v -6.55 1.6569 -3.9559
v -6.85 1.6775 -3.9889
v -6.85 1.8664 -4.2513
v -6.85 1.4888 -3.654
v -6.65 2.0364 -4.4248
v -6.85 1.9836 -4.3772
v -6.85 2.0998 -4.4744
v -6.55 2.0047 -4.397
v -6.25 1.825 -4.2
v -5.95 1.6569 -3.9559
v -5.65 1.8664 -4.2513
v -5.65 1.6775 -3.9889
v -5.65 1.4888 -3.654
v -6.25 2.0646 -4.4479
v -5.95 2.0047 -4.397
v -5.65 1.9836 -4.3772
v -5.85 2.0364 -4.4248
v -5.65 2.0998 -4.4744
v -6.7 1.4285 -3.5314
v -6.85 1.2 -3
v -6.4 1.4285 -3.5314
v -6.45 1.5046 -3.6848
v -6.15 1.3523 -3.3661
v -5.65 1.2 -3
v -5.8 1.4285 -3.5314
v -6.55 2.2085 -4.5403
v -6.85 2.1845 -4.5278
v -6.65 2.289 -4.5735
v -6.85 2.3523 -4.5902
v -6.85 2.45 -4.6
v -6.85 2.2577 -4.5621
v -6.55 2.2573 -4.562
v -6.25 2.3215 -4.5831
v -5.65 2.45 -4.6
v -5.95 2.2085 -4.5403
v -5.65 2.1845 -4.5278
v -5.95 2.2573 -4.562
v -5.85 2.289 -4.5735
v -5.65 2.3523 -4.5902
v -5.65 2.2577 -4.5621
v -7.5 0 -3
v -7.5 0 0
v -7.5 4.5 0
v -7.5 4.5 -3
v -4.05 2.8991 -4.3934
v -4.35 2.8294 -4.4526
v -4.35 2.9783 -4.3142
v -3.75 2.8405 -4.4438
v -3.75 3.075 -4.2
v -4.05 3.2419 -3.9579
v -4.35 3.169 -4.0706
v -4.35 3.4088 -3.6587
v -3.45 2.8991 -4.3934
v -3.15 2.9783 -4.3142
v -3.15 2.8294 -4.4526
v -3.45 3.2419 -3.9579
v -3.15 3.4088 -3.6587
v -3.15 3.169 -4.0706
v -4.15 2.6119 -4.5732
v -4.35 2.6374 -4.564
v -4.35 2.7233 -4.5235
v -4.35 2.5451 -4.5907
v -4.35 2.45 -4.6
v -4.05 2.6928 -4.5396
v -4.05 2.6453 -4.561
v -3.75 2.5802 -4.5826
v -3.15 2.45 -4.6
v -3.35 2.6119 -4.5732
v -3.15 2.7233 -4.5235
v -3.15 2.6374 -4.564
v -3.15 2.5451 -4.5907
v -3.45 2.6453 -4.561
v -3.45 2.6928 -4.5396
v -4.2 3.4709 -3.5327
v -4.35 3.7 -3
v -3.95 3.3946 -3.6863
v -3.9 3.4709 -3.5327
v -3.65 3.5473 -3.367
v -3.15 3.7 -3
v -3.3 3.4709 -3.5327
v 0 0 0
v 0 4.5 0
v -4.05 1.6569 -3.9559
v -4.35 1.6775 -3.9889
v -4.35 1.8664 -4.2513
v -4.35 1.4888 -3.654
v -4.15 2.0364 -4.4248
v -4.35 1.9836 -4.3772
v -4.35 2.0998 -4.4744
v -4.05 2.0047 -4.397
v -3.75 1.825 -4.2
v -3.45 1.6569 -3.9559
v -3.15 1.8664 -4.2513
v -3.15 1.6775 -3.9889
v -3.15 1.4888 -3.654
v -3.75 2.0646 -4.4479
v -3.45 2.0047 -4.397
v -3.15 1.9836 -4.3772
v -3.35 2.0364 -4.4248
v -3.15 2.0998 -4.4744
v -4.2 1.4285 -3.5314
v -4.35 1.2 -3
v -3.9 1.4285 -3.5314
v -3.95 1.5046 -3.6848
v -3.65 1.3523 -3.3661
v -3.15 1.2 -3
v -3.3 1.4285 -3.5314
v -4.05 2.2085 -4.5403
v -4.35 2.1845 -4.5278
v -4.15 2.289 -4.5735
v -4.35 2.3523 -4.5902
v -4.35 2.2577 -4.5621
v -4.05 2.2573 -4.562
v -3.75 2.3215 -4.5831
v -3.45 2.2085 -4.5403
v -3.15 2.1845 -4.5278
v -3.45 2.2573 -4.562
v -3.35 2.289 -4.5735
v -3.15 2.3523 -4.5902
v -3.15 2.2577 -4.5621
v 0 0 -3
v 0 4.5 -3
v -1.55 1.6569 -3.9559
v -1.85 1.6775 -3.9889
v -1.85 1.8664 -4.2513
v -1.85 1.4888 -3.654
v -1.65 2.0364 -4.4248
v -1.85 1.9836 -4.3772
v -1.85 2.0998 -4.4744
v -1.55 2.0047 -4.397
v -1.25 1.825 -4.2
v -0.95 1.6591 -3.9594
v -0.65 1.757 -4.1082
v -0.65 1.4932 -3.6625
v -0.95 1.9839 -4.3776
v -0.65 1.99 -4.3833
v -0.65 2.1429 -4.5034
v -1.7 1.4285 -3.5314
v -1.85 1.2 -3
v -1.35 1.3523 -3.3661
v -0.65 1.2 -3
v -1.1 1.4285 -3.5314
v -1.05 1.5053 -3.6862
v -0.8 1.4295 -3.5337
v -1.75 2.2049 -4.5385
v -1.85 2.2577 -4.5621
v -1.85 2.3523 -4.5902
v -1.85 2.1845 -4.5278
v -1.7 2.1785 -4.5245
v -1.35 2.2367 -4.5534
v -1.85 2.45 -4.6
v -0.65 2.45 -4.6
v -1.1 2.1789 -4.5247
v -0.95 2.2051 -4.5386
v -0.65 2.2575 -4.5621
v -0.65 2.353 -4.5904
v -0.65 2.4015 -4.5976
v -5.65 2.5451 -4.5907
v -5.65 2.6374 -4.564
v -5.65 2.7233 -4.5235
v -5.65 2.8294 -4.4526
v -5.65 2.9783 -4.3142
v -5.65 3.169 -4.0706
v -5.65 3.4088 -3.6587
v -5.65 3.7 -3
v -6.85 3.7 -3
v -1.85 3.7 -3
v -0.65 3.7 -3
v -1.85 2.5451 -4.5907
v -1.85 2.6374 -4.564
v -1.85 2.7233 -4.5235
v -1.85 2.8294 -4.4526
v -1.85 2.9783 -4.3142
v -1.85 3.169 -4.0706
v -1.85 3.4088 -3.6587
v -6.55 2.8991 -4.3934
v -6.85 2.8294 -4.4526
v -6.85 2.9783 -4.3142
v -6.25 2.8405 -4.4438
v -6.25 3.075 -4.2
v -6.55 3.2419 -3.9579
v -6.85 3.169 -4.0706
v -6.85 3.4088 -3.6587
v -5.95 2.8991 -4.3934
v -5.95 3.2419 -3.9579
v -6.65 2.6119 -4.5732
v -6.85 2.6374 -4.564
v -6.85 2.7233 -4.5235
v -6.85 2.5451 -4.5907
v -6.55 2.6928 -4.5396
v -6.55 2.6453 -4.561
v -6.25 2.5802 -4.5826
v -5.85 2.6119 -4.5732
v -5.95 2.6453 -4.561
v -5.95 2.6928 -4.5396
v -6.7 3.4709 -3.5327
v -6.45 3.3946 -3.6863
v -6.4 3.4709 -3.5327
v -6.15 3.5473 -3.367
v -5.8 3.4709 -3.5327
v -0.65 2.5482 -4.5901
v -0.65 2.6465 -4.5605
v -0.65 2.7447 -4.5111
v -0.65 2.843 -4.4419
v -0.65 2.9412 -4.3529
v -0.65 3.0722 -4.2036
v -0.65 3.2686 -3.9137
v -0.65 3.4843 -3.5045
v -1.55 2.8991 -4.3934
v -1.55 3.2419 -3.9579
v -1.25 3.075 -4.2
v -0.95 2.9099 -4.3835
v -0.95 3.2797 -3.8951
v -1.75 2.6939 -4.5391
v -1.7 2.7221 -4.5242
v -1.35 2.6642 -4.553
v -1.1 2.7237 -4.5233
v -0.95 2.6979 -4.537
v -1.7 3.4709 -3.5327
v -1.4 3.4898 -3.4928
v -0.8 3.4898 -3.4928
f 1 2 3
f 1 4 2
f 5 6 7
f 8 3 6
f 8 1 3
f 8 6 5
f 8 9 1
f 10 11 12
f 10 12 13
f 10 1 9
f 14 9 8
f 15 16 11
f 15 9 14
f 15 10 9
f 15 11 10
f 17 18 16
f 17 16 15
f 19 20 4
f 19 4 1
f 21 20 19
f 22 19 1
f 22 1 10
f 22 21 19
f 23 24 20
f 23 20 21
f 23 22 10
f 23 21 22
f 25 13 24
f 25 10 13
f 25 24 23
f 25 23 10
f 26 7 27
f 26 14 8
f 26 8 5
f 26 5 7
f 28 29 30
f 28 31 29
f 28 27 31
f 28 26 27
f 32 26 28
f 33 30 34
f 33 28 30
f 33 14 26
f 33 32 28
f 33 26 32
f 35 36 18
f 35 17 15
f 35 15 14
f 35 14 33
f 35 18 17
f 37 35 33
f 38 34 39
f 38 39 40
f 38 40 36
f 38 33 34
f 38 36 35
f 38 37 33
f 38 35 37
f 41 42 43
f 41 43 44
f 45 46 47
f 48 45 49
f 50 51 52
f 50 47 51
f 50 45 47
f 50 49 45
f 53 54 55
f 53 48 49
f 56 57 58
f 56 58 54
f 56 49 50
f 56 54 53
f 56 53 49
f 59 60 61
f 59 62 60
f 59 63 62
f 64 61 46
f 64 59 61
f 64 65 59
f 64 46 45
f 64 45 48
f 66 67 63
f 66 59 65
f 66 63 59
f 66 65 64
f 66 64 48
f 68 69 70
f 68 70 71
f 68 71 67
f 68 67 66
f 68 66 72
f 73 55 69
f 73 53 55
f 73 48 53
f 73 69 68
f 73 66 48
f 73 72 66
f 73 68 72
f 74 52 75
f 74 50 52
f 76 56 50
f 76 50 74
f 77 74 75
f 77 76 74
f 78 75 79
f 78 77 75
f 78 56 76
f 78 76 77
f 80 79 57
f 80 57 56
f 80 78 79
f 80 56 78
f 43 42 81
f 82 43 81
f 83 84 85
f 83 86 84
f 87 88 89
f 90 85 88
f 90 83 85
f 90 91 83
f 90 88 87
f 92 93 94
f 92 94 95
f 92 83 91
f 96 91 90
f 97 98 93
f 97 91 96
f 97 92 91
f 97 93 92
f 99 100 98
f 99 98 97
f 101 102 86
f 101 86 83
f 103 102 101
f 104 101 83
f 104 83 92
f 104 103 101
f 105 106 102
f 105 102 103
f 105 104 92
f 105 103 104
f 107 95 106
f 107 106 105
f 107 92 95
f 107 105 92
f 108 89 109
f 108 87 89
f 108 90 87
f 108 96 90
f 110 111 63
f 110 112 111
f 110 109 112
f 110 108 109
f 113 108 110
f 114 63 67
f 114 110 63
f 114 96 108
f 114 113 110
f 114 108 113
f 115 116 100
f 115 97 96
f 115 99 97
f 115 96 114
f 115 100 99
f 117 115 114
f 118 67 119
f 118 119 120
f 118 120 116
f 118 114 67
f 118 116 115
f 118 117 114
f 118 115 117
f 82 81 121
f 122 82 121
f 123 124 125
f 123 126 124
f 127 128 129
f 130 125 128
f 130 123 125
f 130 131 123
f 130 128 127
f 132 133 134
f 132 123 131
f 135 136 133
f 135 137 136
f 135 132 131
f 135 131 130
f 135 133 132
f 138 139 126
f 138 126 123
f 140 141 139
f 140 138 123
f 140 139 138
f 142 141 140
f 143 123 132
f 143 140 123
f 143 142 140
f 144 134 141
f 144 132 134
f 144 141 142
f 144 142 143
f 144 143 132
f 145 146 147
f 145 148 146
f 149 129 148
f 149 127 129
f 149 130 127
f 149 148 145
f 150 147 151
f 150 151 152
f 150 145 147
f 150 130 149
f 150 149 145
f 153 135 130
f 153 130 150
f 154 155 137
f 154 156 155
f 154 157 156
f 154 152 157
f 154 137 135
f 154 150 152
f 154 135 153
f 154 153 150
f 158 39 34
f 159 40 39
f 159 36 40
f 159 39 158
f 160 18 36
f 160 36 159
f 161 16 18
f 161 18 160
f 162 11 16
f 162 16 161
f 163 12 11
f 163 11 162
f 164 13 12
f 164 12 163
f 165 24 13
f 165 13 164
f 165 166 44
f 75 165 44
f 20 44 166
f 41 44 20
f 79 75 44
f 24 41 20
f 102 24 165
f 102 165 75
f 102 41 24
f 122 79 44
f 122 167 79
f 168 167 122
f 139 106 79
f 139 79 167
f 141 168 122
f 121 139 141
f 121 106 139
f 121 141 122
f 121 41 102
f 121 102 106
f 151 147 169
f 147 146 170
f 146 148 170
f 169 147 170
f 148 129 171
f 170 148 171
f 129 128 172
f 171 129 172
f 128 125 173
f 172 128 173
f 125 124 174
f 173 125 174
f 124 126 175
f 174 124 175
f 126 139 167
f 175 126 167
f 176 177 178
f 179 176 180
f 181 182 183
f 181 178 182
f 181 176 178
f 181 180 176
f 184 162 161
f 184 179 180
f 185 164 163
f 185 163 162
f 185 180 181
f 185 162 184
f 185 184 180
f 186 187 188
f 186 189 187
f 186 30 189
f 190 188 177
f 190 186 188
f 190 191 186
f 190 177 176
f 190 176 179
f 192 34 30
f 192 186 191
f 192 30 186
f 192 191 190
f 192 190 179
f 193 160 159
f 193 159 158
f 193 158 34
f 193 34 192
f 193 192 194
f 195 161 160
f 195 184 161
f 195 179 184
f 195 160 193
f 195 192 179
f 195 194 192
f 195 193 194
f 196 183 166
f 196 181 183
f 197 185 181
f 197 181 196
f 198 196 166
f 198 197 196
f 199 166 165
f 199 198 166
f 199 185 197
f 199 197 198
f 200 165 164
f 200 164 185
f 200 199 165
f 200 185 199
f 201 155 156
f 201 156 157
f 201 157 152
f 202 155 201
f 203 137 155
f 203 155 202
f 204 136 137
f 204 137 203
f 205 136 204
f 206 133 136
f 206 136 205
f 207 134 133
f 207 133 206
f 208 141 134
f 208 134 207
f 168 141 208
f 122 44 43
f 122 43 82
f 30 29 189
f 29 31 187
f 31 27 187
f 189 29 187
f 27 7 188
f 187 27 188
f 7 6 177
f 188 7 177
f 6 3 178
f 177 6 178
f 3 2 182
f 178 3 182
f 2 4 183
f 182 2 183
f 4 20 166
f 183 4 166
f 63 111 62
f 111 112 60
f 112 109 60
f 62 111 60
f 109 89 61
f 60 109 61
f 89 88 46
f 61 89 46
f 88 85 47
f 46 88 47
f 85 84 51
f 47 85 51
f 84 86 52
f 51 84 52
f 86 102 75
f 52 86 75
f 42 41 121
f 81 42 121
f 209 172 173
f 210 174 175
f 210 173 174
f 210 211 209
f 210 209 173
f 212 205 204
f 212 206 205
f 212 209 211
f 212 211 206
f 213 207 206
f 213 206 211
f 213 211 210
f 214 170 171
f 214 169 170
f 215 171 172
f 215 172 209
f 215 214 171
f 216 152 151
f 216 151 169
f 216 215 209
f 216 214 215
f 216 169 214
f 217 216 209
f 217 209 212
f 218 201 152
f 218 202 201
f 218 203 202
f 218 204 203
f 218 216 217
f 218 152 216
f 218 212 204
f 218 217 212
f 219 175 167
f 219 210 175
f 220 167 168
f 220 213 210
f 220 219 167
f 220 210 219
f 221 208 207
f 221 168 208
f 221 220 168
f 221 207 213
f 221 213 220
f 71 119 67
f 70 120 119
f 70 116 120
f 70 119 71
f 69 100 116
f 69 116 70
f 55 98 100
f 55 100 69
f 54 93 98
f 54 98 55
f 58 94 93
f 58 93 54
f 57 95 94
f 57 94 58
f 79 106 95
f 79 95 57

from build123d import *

# Parameters (mm, degrees)
SKETCH_1_W          = 7.5
SKETCH_1_H          = 3
EXTRUDE_1_DEPTH     = 4.5
SKETCH_2_W          = 1.2
SKETCH_2_H          = 2.5
EXTRUDE_2_DEPTH     = 1.6
CUT_EXTRUDE_1_DEPTH = 10.39853712


with BuildPart() as part:
    # 草图1 → 凸台-拉伸1 (new body)
    with BuildSketch(Plane(origin=(0, 0, 0), x_dir=(1, 0, 0), z_dir=(0, 1, 0))):
        with Locations((-3.75, 1.5)):
            Rectangle(SKETCH_1_W, SKETCH_1_H)
    extrude(amount=EXTRUDE_1_DEPTH)

    # 草图2 → 凸台-拉伸2 (add)
    with BuildSketch(Plane(origin=(0, 0, -3), x_dir=(-1, 0, 0), z_dir=(0, 0, -1))):
        with Locations((1.25, 2.45)):
            Rectangle(SKETCH_2_W, SKETCH_2_H)
        with Locations((3.75, 2.45)):
            Rectangle(SKETCH_2_W, SKETCH_2_H)
        with Locations((6.25, 2.45)):
            Rectangle(SKETCH_2_W, SKETCH_2_H)
    extrude(amount=EXTRUDE_2_DEPTH)

    # 草图3 → 切除-拉伸1 (cut, through all)
    with BuildSketch(Plane(origin=(-0.65, 0, 0), x_dir=(0, 0, -1), z_dir=(1, 0, 0))):
        with BuildLine():
            add(Edge.make_bspline(
                [(4.6, 2.45), (4.6, 3.075), (3, 3.7)],
                knots=[0.5, 0.5, 0.5, 1, 1, 1], degree=2))
            Line((4.6, 2.45), (4.6, 3.7))
            Line((4.6, 3.7), (3, 3.7))
        make_face()
        with BuildLine():
            add(Edge.make_bspline(
                [(3, 1.2), (4.6, 1.825), (4.6, 2.45)],
                knots=[0, 0, 0, 0.5, 0.5, 0.5], degree=2))
            Line((3, 1.2), (4.6, 1.2))
            Line((4.6, 1.2), (4.6, 2.45))
        make_face()
    extrude(amount=-CUT_EXTRUDE_1_DEPTH, mode=Mode.SUBTRACT)


solid = part.part
